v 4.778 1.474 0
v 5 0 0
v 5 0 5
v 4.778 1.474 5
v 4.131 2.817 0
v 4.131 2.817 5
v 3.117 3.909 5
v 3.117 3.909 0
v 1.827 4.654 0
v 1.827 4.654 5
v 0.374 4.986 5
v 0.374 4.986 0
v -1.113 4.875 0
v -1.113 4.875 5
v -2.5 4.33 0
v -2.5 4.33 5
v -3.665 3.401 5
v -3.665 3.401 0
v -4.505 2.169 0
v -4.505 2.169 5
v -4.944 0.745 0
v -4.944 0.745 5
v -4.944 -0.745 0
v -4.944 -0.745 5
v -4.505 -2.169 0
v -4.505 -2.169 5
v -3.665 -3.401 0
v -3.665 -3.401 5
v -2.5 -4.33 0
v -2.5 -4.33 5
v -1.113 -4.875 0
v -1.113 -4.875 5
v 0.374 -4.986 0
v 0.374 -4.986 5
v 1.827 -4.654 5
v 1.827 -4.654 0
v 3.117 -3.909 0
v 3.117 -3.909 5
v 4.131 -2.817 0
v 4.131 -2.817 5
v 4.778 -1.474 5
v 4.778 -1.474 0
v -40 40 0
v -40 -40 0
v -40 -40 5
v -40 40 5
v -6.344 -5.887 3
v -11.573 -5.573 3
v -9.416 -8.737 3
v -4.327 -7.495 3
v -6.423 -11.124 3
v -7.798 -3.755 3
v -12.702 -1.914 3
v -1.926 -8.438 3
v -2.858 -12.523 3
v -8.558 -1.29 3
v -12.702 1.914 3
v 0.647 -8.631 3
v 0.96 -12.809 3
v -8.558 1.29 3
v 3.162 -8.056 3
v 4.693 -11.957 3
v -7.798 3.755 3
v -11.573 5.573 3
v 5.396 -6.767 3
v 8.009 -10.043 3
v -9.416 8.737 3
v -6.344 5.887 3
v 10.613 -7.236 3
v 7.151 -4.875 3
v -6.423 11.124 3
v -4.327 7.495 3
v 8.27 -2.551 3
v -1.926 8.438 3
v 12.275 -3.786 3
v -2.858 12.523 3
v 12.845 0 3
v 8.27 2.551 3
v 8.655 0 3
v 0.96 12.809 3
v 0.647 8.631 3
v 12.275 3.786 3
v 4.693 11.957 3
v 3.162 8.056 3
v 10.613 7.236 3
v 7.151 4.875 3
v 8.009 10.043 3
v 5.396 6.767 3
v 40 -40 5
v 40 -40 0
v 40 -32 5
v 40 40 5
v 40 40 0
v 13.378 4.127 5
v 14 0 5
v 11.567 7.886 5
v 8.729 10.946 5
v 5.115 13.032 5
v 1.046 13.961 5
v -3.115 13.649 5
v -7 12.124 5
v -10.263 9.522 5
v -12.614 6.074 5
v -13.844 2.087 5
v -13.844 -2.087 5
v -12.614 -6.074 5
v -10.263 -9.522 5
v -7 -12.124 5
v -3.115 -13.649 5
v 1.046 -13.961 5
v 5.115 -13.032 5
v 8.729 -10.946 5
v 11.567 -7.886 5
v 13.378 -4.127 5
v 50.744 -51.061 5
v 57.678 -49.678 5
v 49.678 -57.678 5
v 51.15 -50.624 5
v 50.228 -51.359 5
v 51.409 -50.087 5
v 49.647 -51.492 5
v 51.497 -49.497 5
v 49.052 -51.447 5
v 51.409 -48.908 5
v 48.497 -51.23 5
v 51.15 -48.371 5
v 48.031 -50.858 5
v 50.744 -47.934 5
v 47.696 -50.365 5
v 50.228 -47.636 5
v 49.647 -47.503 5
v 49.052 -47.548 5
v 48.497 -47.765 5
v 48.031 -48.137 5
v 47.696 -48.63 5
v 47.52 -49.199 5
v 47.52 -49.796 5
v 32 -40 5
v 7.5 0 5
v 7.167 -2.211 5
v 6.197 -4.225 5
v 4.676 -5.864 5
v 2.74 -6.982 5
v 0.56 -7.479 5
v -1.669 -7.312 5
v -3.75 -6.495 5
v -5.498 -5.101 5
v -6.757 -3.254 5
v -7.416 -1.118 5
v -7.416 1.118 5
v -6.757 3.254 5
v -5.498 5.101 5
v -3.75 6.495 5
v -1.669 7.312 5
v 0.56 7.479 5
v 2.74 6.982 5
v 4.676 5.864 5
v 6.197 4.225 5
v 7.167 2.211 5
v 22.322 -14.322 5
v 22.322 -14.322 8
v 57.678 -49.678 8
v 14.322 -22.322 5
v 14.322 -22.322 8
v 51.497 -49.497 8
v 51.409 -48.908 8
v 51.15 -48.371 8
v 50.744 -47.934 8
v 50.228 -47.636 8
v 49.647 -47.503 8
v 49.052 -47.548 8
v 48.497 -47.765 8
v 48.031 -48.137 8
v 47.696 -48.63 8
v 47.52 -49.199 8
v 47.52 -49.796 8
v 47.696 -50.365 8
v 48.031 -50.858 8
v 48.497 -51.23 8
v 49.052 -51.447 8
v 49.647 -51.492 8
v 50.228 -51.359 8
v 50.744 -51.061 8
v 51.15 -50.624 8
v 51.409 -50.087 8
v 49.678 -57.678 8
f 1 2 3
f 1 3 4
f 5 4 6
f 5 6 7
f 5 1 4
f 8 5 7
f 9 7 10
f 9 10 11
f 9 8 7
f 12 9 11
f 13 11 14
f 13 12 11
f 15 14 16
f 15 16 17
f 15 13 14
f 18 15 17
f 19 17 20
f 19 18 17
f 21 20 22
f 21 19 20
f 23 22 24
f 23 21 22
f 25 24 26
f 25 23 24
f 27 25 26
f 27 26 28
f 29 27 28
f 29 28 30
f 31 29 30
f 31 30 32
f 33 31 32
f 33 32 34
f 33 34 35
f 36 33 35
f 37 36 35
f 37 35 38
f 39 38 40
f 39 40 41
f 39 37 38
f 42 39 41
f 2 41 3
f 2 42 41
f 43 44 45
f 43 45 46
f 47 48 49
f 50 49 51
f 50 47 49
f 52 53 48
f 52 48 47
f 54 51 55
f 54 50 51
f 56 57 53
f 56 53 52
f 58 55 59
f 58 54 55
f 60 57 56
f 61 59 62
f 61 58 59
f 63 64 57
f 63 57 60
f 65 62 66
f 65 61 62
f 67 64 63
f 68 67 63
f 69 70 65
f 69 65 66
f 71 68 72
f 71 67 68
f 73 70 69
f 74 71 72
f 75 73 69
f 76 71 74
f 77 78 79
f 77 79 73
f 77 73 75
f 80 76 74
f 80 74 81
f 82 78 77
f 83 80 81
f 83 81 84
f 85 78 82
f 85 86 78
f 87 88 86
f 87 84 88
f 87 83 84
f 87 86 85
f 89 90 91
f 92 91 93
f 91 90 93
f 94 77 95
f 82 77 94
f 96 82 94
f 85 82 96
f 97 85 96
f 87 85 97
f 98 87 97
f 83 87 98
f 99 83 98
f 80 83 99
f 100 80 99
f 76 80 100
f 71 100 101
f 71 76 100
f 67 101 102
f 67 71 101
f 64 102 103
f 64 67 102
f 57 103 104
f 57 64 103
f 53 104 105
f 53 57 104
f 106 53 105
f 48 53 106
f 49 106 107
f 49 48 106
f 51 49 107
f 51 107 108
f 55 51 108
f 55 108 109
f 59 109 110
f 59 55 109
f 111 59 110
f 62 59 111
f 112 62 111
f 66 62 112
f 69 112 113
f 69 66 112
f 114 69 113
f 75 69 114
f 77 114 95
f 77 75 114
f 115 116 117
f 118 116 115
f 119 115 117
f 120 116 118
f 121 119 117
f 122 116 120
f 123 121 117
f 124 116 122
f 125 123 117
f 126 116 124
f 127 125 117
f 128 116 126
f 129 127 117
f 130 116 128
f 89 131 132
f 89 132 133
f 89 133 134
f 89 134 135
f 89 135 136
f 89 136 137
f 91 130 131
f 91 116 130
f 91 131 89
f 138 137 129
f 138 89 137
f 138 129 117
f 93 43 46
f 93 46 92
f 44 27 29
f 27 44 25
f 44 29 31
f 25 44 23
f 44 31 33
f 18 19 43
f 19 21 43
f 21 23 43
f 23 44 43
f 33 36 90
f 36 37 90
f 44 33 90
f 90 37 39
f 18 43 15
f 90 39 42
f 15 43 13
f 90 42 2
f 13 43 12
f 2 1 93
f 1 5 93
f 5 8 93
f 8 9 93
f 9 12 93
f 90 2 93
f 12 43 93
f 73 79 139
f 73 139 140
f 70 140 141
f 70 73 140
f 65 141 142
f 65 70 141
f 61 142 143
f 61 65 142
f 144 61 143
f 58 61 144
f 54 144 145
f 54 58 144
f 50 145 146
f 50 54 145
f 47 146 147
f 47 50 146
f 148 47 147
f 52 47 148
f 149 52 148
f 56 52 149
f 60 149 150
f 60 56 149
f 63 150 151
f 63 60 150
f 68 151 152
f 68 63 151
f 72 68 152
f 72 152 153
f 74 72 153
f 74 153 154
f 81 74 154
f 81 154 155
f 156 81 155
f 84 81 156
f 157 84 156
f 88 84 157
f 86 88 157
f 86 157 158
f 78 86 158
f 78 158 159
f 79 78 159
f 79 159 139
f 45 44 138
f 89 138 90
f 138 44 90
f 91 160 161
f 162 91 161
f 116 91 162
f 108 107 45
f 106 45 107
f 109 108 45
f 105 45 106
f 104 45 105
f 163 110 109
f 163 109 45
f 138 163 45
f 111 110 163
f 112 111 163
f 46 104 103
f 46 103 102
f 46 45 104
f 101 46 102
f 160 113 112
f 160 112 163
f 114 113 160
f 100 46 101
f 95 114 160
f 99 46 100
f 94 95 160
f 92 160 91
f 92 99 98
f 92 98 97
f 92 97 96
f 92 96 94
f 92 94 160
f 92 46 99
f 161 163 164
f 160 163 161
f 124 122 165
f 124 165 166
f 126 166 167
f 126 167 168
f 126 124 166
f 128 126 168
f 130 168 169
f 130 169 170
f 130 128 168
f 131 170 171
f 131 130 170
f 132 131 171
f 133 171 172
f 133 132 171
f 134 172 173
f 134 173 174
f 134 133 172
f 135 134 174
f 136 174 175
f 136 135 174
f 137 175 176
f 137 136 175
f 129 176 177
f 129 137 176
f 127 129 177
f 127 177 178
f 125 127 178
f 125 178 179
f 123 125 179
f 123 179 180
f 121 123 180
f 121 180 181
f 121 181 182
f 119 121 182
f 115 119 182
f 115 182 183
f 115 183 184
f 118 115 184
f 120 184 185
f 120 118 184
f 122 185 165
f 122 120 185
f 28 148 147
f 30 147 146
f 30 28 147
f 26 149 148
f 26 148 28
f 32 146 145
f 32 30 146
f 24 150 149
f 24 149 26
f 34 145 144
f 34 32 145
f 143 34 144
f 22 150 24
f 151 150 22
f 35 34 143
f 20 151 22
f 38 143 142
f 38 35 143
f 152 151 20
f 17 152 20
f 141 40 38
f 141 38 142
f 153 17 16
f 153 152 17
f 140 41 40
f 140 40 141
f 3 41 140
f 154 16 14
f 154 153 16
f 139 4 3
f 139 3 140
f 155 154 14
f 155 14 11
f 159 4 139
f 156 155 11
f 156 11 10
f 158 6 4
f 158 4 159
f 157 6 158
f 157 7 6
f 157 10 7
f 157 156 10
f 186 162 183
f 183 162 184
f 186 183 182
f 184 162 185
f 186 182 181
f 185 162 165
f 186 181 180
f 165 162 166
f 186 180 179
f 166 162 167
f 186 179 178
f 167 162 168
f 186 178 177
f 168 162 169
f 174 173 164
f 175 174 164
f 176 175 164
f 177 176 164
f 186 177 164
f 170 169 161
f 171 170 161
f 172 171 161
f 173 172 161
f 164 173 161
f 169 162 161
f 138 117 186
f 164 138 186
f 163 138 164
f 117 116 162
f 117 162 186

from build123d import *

# Parameters (mm, degrees)
SKETCH1_W           = 80
SKETCH1_H           = 80
SKETCH1_R           = 5
BOSS_EXTRUDE1_DEPTH = 5
SKETCH2_R           = 14
SKETCH2_R_2         = 7.5
CUT_EXTRUDE1_DEPTH  = 2
CUT_EXTRUDE1_TAPER  = 30
SKETCH3_R           = 2
BOSS_EXTRUDE2_DEPTH = 3


with BuildPart() as part:
    # Sketch1 → Boss-Extrude1 (new body)
    with BuildSketch(Plane.XY):
        Rectangle(SKETCH1_W, SKETCH1_H)
        Circle(SKETCH1_R, mode=Mode.SUBTRACT)
    extrude(amount=BOSS_EXTRUDE1_DEPTH)

    # Sketch2 → Cut-Extrude1 (cut)
    with BuildSketch(Plane.XY.offset(5)):
        Circle(SKETCH2_R)
        Circle(SKETCH2_R_2, mode=Mode.SUBTRACT)
    extrude(amount=-CUT_EXTRUDE1_DEPTH, taper=CUT_EXTRUDE1_TAPER, mode=Mode.SUBTRACT)

    # Sketch3 → Boss-Extrude2 (add)
    with BuildSketch(Plane.XY.offset(5)):
        Polygon((49.67766953, -57.67766953), (14.32233047, -22.32233047), (22.32233047, -14.32233047), (57.67766953, -49.67766953), align=None)
        with Locations((49.497474683, -49.497474683)):
            Circle(SKETCH3_R, mode=Mode.SUBTRACT)
    extrude(amount=BOSS_EXTRUDE2_DEPTH)


solid = part.part
